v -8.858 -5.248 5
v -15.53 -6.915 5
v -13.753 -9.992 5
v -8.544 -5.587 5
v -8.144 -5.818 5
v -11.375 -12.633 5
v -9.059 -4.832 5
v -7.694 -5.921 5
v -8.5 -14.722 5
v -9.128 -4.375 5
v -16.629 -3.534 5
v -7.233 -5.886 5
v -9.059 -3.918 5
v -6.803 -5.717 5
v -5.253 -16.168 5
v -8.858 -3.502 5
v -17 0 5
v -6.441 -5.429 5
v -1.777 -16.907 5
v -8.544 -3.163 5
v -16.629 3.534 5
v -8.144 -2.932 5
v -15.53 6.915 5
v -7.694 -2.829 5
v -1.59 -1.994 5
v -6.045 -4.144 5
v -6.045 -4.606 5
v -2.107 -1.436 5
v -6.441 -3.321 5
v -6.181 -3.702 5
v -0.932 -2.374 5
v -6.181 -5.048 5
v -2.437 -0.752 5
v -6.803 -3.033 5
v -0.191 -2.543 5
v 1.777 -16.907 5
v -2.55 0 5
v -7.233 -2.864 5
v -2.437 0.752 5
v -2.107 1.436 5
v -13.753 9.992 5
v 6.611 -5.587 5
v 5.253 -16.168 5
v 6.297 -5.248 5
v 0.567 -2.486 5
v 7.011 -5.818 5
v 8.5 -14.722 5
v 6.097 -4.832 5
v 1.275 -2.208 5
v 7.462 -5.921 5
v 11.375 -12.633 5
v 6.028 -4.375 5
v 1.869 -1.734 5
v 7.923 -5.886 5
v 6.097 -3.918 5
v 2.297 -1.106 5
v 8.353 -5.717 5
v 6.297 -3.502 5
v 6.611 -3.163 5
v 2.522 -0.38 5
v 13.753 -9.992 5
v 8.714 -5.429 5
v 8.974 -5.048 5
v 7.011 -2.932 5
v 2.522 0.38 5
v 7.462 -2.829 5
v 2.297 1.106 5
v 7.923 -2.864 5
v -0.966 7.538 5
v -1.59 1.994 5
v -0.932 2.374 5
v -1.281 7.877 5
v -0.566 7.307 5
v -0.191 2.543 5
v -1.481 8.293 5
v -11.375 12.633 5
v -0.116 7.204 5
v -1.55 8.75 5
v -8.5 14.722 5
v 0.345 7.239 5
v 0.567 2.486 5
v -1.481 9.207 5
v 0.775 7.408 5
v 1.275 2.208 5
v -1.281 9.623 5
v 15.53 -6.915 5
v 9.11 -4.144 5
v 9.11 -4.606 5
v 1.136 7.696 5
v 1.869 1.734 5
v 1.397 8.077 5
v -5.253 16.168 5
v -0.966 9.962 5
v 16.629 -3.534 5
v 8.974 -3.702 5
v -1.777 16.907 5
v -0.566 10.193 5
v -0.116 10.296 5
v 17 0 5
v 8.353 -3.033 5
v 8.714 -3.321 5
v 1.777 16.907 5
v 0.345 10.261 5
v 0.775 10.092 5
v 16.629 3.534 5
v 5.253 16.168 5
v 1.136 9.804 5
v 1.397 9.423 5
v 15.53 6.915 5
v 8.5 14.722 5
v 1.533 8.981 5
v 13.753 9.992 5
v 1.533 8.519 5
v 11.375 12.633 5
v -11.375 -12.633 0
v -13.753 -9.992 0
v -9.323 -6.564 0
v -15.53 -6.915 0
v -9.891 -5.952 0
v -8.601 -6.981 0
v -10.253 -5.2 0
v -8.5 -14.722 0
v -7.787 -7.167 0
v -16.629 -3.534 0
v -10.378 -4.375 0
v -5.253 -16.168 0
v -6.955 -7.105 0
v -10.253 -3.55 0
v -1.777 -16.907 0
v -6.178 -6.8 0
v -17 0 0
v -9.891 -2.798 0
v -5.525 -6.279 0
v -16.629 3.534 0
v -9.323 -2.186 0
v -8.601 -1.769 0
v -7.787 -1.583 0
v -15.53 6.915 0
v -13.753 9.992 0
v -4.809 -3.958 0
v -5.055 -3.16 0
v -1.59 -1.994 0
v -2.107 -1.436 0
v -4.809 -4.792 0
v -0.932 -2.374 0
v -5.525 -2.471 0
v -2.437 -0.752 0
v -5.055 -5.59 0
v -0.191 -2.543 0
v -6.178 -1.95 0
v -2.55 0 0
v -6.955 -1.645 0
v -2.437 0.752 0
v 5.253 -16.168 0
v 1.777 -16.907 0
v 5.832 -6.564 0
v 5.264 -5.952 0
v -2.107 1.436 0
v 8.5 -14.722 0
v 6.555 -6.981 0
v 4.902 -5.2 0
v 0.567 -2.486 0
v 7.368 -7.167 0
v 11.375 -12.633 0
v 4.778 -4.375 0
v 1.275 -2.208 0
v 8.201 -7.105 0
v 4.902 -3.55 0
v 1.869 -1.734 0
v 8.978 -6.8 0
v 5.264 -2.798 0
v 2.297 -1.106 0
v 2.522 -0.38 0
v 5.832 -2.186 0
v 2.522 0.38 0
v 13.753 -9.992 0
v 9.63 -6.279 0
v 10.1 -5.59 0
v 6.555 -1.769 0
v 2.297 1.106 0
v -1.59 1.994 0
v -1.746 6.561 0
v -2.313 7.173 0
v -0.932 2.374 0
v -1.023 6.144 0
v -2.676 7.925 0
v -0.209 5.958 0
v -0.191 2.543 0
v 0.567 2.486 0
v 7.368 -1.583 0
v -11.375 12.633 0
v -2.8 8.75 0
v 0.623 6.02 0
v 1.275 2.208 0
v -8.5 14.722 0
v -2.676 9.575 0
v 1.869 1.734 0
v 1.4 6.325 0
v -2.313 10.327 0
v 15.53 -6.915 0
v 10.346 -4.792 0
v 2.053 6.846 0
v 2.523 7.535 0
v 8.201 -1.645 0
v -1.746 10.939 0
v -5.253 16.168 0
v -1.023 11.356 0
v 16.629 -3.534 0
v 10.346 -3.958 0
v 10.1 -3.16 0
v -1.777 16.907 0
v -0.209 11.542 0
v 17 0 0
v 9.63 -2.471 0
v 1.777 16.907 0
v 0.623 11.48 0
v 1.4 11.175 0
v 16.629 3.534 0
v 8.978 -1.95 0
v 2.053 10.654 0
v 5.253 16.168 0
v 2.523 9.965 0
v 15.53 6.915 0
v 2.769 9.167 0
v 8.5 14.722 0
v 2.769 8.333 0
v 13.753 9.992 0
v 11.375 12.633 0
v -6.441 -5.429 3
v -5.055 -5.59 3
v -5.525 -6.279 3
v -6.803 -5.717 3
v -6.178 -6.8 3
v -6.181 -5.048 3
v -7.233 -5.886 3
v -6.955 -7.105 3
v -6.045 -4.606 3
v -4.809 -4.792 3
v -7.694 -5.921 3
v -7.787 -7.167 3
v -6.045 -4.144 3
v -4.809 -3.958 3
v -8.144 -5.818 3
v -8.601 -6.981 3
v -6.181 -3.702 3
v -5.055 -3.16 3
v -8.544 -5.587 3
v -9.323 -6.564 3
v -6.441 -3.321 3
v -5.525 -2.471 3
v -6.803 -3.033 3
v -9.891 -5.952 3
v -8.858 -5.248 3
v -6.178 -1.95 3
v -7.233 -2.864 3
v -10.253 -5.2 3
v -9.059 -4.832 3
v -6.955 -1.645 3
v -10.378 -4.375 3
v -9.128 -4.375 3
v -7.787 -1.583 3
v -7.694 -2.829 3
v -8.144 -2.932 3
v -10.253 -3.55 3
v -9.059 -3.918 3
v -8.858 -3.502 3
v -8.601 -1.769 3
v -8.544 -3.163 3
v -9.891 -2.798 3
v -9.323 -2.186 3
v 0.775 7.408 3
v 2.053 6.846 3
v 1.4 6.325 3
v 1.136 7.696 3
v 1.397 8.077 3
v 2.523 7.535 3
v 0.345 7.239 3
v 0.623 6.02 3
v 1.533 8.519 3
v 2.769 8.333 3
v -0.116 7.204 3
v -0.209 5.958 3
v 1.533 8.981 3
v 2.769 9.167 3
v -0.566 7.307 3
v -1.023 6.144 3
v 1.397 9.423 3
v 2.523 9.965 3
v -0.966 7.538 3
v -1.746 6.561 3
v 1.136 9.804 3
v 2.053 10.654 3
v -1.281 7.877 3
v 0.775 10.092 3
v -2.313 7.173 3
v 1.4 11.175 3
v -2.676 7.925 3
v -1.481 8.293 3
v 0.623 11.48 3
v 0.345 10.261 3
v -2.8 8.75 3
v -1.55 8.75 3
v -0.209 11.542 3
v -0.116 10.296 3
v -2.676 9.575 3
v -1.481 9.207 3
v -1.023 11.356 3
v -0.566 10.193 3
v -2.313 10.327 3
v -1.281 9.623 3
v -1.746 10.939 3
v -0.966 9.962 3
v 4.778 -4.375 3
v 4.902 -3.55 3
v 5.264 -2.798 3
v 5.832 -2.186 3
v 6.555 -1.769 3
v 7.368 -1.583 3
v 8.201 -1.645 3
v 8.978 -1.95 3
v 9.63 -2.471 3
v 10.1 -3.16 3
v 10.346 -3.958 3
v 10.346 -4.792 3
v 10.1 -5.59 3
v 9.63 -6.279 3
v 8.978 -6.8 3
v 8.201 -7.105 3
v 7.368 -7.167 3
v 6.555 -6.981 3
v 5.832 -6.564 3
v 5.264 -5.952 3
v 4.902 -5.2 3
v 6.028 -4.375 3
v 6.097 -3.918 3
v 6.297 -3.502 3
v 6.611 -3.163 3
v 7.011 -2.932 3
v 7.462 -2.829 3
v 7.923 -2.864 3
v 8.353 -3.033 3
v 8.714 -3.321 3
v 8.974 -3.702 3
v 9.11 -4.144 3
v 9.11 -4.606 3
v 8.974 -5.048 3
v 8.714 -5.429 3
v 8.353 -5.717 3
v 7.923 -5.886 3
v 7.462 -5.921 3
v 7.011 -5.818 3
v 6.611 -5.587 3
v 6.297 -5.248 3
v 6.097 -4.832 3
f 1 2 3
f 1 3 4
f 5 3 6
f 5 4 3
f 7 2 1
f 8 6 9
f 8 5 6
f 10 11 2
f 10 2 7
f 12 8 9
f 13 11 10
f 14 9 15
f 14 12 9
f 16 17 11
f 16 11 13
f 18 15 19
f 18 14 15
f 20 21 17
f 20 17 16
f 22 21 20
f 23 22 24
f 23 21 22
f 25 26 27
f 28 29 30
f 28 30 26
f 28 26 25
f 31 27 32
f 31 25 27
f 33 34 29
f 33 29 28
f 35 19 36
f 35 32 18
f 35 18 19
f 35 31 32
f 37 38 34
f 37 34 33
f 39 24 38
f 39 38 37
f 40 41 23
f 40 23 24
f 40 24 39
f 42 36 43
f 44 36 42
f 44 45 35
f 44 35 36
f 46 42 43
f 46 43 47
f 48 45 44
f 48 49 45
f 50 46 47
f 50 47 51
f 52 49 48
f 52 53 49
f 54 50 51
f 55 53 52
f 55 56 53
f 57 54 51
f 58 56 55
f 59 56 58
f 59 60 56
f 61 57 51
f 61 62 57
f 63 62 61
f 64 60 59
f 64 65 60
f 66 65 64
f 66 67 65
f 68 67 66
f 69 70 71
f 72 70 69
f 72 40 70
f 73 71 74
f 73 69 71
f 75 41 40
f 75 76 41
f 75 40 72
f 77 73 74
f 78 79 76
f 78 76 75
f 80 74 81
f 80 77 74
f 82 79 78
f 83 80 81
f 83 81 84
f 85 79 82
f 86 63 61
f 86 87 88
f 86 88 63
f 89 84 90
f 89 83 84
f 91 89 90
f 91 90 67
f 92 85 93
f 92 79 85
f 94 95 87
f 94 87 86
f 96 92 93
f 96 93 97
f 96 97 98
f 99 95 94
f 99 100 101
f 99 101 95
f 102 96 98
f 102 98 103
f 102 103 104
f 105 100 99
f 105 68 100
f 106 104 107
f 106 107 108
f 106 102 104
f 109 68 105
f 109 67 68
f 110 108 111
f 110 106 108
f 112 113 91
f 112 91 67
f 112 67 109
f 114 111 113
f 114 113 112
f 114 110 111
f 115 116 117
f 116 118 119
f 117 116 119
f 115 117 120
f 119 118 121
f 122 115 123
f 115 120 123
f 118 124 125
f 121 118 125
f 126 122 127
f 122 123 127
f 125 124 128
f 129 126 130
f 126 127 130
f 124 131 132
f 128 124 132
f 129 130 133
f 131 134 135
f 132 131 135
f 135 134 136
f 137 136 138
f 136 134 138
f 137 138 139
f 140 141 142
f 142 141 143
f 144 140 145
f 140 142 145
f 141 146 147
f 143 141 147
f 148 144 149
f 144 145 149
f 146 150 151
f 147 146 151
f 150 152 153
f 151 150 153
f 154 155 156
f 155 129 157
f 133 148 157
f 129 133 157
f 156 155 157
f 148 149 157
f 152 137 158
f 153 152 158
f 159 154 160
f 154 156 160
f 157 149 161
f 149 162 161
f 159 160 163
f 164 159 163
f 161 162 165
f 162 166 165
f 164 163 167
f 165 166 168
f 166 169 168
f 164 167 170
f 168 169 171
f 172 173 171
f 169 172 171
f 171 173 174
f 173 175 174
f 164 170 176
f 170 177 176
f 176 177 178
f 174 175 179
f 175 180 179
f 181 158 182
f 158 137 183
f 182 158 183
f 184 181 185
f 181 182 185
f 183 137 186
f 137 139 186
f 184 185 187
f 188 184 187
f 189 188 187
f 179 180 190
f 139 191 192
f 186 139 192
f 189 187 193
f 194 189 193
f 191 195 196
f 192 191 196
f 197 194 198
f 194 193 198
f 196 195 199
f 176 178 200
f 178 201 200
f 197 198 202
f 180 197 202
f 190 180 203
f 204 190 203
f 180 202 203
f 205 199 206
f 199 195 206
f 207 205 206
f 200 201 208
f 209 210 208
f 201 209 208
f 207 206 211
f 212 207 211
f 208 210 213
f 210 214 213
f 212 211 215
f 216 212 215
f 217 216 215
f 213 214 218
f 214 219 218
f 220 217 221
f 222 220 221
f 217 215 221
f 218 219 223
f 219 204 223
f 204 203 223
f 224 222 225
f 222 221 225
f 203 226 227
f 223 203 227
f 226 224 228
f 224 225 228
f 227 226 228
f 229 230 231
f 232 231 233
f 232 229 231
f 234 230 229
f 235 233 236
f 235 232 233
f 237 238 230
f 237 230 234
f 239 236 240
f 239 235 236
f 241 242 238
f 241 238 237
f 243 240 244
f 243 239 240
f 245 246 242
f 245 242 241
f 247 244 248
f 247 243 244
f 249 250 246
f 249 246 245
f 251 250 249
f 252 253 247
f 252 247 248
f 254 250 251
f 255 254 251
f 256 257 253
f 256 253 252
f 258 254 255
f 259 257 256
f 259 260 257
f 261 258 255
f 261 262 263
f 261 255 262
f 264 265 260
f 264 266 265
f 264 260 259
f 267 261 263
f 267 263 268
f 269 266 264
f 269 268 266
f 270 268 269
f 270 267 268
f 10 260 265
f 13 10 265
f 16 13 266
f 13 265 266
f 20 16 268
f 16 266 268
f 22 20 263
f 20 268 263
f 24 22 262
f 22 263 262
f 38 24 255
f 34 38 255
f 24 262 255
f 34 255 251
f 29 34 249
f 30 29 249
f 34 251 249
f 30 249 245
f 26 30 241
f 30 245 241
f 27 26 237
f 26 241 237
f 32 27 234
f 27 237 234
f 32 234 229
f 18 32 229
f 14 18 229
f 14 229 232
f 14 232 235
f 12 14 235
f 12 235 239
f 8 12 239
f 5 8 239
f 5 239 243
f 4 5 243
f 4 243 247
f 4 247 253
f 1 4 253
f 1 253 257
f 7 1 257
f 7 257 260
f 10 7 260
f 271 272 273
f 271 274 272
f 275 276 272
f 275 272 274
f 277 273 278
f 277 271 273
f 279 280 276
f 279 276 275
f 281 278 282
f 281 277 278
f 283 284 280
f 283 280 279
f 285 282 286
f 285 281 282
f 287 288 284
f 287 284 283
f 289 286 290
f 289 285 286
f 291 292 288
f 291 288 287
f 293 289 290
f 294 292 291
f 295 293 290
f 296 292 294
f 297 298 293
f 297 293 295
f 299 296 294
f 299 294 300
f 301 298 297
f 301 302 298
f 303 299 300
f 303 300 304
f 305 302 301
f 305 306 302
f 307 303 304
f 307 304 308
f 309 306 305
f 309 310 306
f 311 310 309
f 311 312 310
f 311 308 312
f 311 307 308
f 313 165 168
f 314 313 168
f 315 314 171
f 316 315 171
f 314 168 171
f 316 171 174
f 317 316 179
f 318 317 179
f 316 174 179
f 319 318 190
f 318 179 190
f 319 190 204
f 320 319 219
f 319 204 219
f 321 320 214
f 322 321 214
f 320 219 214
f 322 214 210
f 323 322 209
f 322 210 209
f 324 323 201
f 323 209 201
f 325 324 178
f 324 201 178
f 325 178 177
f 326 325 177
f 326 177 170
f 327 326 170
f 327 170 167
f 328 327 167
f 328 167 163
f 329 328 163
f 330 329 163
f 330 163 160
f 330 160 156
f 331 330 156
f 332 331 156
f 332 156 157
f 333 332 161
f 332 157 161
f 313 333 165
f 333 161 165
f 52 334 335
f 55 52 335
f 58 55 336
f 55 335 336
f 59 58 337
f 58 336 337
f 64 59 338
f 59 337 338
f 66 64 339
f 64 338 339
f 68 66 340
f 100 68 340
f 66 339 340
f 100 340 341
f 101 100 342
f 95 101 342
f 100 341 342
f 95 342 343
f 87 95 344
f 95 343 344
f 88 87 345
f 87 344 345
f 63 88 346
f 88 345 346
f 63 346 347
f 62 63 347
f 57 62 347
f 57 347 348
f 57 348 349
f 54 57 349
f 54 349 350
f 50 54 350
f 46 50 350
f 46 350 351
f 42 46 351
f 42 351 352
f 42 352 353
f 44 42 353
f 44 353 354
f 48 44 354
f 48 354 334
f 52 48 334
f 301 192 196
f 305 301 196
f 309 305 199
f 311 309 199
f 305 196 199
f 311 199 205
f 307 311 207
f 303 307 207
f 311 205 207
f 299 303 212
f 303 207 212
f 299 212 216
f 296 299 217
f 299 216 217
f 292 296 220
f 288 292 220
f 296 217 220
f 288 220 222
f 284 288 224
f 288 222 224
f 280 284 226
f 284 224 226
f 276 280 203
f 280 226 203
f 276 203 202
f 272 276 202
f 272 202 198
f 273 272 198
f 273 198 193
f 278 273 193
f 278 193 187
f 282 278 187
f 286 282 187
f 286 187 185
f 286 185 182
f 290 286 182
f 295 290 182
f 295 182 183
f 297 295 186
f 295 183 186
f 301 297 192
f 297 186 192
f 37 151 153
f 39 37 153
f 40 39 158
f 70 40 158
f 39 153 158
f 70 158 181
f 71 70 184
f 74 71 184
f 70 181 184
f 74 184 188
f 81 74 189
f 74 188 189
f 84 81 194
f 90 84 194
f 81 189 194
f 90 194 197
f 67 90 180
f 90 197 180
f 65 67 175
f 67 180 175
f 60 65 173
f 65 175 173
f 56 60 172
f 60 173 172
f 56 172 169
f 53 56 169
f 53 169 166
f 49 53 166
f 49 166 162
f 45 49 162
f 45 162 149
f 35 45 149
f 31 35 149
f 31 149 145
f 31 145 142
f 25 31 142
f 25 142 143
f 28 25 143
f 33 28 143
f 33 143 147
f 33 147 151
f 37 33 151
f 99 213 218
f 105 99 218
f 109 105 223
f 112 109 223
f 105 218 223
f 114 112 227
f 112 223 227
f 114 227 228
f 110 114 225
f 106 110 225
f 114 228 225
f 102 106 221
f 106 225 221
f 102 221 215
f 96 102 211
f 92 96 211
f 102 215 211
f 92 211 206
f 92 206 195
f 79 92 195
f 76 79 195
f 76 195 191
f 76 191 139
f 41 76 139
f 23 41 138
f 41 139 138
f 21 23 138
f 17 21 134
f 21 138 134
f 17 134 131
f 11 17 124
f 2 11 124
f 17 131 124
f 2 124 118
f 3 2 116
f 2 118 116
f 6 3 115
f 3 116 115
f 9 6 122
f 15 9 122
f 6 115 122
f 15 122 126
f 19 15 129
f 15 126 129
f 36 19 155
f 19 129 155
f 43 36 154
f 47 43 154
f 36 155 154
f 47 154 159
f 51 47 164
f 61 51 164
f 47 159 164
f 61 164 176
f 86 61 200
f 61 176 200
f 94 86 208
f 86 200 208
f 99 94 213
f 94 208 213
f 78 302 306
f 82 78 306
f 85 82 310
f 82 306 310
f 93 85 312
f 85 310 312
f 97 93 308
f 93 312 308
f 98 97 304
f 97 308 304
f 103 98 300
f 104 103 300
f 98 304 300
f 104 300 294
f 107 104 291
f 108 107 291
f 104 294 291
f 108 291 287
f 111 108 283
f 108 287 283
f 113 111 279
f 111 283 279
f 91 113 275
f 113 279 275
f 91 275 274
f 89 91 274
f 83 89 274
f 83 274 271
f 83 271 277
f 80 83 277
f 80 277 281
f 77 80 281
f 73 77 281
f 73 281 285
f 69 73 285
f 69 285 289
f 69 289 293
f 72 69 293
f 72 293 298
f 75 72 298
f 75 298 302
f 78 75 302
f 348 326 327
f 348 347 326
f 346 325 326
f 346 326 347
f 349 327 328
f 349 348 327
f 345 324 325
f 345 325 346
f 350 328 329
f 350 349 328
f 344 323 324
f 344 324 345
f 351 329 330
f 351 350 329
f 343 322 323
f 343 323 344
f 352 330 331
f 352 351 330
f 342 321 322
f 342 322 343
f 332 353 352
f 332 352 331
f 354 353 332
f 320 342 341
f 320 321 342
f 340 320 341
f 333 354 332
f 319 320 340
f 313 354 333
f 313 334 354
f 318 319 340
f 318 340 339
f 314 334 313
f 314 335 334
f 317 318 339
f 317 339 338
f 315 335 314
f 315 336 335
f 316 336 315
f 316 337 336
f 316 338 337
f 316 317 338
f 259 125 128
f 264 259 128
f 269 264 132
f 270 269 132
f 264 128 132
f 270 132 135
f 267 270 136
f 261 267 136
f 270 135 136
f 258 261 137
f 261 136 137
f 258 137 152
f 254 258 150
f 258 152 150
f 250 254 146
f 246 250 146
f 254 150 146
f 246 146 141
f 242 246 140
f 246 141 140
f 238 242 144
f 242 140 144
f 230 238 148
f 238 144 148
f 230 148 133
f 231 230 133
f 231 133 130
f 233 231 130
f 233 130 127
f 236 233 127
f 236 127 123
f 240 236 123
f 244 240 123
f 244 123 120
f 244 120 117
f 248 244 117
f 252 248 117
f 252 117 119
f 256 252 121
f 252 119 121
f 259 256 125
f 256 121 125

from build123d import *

# Parameters (mm, degrees)
SKETCH_1_R          = 17
EXTRUDE_1_DEPTH     = 5
SKETCH_2_R          = 2.8
CUT_EXTRUDE_1_DEPTH = 3
SKETCH_3_R          = 2.55
CUT_EXTRUDE_2_DEPTH = 6
SKETCH_7_R          = 1.55
CUT_EXTRUDE_4_DEPTH = 3


with BuildPart() as part:
    # 草图1 → 凸台-拉伸1 (new body)
    with BuildSketch(Plane.XY):
        Circle(SKETCH_1_R)
    extrude(amount=EXTRUDE_1_DEPTH)

    # 草图2 → 切除-拉伸1 (cut)
    with BuildSketch(Plane(origin=(0, 0, 0), x_dir=(-1, 0, 0), z_dir=(0, 0, -1))):
        with Locations((0, 8.75)):
            Circle(SKETCH_2_R)
        with Locations((7.577722283, -4.375)):
            Circle(SKETCH_2_R)
        with Locations((-7.577722283, -4.375)):
            Circle(SKETCH_2_R)
    extrude(amount=-CUT_EXTRUDE_1_DEPTH, mode=Mode.SUBTRACT)

    # 草图3 → 切除-拉伸2 (cut, through all)
    with BuildSketch(Plane(origin=(0, 0, 0), x_dir=(-1, 0, 0), z_dir=(0, 0, -1))):
        Circle(SKETCH_3_R)
    extrude(amount=-CUT_EXTRUDE_2_DEPTH, mode=Mode.SUBTRACT)

    # 草图7 → 切除-拉伸4 (cut, through all)
    with BuildSketch(Plane(origin=(0, 0, 3), x_dir=(-1, 0, 0), z_dir=(0, 0, -1))):
        with Locations((-7.577722283, -4.375)):
            Circle(SKETCH_7_R)
        with Locations((7.577722283, -4.375)):
            Circle(SKETCH_7_R)
        with Locations((0, 8.75)):
            Circle(SKETCH_7_R)
    extrude(amount=-CUT_EXTRUDE_4_DEPTH, mode=Mode.SUBTRACT)


solid = part.part
